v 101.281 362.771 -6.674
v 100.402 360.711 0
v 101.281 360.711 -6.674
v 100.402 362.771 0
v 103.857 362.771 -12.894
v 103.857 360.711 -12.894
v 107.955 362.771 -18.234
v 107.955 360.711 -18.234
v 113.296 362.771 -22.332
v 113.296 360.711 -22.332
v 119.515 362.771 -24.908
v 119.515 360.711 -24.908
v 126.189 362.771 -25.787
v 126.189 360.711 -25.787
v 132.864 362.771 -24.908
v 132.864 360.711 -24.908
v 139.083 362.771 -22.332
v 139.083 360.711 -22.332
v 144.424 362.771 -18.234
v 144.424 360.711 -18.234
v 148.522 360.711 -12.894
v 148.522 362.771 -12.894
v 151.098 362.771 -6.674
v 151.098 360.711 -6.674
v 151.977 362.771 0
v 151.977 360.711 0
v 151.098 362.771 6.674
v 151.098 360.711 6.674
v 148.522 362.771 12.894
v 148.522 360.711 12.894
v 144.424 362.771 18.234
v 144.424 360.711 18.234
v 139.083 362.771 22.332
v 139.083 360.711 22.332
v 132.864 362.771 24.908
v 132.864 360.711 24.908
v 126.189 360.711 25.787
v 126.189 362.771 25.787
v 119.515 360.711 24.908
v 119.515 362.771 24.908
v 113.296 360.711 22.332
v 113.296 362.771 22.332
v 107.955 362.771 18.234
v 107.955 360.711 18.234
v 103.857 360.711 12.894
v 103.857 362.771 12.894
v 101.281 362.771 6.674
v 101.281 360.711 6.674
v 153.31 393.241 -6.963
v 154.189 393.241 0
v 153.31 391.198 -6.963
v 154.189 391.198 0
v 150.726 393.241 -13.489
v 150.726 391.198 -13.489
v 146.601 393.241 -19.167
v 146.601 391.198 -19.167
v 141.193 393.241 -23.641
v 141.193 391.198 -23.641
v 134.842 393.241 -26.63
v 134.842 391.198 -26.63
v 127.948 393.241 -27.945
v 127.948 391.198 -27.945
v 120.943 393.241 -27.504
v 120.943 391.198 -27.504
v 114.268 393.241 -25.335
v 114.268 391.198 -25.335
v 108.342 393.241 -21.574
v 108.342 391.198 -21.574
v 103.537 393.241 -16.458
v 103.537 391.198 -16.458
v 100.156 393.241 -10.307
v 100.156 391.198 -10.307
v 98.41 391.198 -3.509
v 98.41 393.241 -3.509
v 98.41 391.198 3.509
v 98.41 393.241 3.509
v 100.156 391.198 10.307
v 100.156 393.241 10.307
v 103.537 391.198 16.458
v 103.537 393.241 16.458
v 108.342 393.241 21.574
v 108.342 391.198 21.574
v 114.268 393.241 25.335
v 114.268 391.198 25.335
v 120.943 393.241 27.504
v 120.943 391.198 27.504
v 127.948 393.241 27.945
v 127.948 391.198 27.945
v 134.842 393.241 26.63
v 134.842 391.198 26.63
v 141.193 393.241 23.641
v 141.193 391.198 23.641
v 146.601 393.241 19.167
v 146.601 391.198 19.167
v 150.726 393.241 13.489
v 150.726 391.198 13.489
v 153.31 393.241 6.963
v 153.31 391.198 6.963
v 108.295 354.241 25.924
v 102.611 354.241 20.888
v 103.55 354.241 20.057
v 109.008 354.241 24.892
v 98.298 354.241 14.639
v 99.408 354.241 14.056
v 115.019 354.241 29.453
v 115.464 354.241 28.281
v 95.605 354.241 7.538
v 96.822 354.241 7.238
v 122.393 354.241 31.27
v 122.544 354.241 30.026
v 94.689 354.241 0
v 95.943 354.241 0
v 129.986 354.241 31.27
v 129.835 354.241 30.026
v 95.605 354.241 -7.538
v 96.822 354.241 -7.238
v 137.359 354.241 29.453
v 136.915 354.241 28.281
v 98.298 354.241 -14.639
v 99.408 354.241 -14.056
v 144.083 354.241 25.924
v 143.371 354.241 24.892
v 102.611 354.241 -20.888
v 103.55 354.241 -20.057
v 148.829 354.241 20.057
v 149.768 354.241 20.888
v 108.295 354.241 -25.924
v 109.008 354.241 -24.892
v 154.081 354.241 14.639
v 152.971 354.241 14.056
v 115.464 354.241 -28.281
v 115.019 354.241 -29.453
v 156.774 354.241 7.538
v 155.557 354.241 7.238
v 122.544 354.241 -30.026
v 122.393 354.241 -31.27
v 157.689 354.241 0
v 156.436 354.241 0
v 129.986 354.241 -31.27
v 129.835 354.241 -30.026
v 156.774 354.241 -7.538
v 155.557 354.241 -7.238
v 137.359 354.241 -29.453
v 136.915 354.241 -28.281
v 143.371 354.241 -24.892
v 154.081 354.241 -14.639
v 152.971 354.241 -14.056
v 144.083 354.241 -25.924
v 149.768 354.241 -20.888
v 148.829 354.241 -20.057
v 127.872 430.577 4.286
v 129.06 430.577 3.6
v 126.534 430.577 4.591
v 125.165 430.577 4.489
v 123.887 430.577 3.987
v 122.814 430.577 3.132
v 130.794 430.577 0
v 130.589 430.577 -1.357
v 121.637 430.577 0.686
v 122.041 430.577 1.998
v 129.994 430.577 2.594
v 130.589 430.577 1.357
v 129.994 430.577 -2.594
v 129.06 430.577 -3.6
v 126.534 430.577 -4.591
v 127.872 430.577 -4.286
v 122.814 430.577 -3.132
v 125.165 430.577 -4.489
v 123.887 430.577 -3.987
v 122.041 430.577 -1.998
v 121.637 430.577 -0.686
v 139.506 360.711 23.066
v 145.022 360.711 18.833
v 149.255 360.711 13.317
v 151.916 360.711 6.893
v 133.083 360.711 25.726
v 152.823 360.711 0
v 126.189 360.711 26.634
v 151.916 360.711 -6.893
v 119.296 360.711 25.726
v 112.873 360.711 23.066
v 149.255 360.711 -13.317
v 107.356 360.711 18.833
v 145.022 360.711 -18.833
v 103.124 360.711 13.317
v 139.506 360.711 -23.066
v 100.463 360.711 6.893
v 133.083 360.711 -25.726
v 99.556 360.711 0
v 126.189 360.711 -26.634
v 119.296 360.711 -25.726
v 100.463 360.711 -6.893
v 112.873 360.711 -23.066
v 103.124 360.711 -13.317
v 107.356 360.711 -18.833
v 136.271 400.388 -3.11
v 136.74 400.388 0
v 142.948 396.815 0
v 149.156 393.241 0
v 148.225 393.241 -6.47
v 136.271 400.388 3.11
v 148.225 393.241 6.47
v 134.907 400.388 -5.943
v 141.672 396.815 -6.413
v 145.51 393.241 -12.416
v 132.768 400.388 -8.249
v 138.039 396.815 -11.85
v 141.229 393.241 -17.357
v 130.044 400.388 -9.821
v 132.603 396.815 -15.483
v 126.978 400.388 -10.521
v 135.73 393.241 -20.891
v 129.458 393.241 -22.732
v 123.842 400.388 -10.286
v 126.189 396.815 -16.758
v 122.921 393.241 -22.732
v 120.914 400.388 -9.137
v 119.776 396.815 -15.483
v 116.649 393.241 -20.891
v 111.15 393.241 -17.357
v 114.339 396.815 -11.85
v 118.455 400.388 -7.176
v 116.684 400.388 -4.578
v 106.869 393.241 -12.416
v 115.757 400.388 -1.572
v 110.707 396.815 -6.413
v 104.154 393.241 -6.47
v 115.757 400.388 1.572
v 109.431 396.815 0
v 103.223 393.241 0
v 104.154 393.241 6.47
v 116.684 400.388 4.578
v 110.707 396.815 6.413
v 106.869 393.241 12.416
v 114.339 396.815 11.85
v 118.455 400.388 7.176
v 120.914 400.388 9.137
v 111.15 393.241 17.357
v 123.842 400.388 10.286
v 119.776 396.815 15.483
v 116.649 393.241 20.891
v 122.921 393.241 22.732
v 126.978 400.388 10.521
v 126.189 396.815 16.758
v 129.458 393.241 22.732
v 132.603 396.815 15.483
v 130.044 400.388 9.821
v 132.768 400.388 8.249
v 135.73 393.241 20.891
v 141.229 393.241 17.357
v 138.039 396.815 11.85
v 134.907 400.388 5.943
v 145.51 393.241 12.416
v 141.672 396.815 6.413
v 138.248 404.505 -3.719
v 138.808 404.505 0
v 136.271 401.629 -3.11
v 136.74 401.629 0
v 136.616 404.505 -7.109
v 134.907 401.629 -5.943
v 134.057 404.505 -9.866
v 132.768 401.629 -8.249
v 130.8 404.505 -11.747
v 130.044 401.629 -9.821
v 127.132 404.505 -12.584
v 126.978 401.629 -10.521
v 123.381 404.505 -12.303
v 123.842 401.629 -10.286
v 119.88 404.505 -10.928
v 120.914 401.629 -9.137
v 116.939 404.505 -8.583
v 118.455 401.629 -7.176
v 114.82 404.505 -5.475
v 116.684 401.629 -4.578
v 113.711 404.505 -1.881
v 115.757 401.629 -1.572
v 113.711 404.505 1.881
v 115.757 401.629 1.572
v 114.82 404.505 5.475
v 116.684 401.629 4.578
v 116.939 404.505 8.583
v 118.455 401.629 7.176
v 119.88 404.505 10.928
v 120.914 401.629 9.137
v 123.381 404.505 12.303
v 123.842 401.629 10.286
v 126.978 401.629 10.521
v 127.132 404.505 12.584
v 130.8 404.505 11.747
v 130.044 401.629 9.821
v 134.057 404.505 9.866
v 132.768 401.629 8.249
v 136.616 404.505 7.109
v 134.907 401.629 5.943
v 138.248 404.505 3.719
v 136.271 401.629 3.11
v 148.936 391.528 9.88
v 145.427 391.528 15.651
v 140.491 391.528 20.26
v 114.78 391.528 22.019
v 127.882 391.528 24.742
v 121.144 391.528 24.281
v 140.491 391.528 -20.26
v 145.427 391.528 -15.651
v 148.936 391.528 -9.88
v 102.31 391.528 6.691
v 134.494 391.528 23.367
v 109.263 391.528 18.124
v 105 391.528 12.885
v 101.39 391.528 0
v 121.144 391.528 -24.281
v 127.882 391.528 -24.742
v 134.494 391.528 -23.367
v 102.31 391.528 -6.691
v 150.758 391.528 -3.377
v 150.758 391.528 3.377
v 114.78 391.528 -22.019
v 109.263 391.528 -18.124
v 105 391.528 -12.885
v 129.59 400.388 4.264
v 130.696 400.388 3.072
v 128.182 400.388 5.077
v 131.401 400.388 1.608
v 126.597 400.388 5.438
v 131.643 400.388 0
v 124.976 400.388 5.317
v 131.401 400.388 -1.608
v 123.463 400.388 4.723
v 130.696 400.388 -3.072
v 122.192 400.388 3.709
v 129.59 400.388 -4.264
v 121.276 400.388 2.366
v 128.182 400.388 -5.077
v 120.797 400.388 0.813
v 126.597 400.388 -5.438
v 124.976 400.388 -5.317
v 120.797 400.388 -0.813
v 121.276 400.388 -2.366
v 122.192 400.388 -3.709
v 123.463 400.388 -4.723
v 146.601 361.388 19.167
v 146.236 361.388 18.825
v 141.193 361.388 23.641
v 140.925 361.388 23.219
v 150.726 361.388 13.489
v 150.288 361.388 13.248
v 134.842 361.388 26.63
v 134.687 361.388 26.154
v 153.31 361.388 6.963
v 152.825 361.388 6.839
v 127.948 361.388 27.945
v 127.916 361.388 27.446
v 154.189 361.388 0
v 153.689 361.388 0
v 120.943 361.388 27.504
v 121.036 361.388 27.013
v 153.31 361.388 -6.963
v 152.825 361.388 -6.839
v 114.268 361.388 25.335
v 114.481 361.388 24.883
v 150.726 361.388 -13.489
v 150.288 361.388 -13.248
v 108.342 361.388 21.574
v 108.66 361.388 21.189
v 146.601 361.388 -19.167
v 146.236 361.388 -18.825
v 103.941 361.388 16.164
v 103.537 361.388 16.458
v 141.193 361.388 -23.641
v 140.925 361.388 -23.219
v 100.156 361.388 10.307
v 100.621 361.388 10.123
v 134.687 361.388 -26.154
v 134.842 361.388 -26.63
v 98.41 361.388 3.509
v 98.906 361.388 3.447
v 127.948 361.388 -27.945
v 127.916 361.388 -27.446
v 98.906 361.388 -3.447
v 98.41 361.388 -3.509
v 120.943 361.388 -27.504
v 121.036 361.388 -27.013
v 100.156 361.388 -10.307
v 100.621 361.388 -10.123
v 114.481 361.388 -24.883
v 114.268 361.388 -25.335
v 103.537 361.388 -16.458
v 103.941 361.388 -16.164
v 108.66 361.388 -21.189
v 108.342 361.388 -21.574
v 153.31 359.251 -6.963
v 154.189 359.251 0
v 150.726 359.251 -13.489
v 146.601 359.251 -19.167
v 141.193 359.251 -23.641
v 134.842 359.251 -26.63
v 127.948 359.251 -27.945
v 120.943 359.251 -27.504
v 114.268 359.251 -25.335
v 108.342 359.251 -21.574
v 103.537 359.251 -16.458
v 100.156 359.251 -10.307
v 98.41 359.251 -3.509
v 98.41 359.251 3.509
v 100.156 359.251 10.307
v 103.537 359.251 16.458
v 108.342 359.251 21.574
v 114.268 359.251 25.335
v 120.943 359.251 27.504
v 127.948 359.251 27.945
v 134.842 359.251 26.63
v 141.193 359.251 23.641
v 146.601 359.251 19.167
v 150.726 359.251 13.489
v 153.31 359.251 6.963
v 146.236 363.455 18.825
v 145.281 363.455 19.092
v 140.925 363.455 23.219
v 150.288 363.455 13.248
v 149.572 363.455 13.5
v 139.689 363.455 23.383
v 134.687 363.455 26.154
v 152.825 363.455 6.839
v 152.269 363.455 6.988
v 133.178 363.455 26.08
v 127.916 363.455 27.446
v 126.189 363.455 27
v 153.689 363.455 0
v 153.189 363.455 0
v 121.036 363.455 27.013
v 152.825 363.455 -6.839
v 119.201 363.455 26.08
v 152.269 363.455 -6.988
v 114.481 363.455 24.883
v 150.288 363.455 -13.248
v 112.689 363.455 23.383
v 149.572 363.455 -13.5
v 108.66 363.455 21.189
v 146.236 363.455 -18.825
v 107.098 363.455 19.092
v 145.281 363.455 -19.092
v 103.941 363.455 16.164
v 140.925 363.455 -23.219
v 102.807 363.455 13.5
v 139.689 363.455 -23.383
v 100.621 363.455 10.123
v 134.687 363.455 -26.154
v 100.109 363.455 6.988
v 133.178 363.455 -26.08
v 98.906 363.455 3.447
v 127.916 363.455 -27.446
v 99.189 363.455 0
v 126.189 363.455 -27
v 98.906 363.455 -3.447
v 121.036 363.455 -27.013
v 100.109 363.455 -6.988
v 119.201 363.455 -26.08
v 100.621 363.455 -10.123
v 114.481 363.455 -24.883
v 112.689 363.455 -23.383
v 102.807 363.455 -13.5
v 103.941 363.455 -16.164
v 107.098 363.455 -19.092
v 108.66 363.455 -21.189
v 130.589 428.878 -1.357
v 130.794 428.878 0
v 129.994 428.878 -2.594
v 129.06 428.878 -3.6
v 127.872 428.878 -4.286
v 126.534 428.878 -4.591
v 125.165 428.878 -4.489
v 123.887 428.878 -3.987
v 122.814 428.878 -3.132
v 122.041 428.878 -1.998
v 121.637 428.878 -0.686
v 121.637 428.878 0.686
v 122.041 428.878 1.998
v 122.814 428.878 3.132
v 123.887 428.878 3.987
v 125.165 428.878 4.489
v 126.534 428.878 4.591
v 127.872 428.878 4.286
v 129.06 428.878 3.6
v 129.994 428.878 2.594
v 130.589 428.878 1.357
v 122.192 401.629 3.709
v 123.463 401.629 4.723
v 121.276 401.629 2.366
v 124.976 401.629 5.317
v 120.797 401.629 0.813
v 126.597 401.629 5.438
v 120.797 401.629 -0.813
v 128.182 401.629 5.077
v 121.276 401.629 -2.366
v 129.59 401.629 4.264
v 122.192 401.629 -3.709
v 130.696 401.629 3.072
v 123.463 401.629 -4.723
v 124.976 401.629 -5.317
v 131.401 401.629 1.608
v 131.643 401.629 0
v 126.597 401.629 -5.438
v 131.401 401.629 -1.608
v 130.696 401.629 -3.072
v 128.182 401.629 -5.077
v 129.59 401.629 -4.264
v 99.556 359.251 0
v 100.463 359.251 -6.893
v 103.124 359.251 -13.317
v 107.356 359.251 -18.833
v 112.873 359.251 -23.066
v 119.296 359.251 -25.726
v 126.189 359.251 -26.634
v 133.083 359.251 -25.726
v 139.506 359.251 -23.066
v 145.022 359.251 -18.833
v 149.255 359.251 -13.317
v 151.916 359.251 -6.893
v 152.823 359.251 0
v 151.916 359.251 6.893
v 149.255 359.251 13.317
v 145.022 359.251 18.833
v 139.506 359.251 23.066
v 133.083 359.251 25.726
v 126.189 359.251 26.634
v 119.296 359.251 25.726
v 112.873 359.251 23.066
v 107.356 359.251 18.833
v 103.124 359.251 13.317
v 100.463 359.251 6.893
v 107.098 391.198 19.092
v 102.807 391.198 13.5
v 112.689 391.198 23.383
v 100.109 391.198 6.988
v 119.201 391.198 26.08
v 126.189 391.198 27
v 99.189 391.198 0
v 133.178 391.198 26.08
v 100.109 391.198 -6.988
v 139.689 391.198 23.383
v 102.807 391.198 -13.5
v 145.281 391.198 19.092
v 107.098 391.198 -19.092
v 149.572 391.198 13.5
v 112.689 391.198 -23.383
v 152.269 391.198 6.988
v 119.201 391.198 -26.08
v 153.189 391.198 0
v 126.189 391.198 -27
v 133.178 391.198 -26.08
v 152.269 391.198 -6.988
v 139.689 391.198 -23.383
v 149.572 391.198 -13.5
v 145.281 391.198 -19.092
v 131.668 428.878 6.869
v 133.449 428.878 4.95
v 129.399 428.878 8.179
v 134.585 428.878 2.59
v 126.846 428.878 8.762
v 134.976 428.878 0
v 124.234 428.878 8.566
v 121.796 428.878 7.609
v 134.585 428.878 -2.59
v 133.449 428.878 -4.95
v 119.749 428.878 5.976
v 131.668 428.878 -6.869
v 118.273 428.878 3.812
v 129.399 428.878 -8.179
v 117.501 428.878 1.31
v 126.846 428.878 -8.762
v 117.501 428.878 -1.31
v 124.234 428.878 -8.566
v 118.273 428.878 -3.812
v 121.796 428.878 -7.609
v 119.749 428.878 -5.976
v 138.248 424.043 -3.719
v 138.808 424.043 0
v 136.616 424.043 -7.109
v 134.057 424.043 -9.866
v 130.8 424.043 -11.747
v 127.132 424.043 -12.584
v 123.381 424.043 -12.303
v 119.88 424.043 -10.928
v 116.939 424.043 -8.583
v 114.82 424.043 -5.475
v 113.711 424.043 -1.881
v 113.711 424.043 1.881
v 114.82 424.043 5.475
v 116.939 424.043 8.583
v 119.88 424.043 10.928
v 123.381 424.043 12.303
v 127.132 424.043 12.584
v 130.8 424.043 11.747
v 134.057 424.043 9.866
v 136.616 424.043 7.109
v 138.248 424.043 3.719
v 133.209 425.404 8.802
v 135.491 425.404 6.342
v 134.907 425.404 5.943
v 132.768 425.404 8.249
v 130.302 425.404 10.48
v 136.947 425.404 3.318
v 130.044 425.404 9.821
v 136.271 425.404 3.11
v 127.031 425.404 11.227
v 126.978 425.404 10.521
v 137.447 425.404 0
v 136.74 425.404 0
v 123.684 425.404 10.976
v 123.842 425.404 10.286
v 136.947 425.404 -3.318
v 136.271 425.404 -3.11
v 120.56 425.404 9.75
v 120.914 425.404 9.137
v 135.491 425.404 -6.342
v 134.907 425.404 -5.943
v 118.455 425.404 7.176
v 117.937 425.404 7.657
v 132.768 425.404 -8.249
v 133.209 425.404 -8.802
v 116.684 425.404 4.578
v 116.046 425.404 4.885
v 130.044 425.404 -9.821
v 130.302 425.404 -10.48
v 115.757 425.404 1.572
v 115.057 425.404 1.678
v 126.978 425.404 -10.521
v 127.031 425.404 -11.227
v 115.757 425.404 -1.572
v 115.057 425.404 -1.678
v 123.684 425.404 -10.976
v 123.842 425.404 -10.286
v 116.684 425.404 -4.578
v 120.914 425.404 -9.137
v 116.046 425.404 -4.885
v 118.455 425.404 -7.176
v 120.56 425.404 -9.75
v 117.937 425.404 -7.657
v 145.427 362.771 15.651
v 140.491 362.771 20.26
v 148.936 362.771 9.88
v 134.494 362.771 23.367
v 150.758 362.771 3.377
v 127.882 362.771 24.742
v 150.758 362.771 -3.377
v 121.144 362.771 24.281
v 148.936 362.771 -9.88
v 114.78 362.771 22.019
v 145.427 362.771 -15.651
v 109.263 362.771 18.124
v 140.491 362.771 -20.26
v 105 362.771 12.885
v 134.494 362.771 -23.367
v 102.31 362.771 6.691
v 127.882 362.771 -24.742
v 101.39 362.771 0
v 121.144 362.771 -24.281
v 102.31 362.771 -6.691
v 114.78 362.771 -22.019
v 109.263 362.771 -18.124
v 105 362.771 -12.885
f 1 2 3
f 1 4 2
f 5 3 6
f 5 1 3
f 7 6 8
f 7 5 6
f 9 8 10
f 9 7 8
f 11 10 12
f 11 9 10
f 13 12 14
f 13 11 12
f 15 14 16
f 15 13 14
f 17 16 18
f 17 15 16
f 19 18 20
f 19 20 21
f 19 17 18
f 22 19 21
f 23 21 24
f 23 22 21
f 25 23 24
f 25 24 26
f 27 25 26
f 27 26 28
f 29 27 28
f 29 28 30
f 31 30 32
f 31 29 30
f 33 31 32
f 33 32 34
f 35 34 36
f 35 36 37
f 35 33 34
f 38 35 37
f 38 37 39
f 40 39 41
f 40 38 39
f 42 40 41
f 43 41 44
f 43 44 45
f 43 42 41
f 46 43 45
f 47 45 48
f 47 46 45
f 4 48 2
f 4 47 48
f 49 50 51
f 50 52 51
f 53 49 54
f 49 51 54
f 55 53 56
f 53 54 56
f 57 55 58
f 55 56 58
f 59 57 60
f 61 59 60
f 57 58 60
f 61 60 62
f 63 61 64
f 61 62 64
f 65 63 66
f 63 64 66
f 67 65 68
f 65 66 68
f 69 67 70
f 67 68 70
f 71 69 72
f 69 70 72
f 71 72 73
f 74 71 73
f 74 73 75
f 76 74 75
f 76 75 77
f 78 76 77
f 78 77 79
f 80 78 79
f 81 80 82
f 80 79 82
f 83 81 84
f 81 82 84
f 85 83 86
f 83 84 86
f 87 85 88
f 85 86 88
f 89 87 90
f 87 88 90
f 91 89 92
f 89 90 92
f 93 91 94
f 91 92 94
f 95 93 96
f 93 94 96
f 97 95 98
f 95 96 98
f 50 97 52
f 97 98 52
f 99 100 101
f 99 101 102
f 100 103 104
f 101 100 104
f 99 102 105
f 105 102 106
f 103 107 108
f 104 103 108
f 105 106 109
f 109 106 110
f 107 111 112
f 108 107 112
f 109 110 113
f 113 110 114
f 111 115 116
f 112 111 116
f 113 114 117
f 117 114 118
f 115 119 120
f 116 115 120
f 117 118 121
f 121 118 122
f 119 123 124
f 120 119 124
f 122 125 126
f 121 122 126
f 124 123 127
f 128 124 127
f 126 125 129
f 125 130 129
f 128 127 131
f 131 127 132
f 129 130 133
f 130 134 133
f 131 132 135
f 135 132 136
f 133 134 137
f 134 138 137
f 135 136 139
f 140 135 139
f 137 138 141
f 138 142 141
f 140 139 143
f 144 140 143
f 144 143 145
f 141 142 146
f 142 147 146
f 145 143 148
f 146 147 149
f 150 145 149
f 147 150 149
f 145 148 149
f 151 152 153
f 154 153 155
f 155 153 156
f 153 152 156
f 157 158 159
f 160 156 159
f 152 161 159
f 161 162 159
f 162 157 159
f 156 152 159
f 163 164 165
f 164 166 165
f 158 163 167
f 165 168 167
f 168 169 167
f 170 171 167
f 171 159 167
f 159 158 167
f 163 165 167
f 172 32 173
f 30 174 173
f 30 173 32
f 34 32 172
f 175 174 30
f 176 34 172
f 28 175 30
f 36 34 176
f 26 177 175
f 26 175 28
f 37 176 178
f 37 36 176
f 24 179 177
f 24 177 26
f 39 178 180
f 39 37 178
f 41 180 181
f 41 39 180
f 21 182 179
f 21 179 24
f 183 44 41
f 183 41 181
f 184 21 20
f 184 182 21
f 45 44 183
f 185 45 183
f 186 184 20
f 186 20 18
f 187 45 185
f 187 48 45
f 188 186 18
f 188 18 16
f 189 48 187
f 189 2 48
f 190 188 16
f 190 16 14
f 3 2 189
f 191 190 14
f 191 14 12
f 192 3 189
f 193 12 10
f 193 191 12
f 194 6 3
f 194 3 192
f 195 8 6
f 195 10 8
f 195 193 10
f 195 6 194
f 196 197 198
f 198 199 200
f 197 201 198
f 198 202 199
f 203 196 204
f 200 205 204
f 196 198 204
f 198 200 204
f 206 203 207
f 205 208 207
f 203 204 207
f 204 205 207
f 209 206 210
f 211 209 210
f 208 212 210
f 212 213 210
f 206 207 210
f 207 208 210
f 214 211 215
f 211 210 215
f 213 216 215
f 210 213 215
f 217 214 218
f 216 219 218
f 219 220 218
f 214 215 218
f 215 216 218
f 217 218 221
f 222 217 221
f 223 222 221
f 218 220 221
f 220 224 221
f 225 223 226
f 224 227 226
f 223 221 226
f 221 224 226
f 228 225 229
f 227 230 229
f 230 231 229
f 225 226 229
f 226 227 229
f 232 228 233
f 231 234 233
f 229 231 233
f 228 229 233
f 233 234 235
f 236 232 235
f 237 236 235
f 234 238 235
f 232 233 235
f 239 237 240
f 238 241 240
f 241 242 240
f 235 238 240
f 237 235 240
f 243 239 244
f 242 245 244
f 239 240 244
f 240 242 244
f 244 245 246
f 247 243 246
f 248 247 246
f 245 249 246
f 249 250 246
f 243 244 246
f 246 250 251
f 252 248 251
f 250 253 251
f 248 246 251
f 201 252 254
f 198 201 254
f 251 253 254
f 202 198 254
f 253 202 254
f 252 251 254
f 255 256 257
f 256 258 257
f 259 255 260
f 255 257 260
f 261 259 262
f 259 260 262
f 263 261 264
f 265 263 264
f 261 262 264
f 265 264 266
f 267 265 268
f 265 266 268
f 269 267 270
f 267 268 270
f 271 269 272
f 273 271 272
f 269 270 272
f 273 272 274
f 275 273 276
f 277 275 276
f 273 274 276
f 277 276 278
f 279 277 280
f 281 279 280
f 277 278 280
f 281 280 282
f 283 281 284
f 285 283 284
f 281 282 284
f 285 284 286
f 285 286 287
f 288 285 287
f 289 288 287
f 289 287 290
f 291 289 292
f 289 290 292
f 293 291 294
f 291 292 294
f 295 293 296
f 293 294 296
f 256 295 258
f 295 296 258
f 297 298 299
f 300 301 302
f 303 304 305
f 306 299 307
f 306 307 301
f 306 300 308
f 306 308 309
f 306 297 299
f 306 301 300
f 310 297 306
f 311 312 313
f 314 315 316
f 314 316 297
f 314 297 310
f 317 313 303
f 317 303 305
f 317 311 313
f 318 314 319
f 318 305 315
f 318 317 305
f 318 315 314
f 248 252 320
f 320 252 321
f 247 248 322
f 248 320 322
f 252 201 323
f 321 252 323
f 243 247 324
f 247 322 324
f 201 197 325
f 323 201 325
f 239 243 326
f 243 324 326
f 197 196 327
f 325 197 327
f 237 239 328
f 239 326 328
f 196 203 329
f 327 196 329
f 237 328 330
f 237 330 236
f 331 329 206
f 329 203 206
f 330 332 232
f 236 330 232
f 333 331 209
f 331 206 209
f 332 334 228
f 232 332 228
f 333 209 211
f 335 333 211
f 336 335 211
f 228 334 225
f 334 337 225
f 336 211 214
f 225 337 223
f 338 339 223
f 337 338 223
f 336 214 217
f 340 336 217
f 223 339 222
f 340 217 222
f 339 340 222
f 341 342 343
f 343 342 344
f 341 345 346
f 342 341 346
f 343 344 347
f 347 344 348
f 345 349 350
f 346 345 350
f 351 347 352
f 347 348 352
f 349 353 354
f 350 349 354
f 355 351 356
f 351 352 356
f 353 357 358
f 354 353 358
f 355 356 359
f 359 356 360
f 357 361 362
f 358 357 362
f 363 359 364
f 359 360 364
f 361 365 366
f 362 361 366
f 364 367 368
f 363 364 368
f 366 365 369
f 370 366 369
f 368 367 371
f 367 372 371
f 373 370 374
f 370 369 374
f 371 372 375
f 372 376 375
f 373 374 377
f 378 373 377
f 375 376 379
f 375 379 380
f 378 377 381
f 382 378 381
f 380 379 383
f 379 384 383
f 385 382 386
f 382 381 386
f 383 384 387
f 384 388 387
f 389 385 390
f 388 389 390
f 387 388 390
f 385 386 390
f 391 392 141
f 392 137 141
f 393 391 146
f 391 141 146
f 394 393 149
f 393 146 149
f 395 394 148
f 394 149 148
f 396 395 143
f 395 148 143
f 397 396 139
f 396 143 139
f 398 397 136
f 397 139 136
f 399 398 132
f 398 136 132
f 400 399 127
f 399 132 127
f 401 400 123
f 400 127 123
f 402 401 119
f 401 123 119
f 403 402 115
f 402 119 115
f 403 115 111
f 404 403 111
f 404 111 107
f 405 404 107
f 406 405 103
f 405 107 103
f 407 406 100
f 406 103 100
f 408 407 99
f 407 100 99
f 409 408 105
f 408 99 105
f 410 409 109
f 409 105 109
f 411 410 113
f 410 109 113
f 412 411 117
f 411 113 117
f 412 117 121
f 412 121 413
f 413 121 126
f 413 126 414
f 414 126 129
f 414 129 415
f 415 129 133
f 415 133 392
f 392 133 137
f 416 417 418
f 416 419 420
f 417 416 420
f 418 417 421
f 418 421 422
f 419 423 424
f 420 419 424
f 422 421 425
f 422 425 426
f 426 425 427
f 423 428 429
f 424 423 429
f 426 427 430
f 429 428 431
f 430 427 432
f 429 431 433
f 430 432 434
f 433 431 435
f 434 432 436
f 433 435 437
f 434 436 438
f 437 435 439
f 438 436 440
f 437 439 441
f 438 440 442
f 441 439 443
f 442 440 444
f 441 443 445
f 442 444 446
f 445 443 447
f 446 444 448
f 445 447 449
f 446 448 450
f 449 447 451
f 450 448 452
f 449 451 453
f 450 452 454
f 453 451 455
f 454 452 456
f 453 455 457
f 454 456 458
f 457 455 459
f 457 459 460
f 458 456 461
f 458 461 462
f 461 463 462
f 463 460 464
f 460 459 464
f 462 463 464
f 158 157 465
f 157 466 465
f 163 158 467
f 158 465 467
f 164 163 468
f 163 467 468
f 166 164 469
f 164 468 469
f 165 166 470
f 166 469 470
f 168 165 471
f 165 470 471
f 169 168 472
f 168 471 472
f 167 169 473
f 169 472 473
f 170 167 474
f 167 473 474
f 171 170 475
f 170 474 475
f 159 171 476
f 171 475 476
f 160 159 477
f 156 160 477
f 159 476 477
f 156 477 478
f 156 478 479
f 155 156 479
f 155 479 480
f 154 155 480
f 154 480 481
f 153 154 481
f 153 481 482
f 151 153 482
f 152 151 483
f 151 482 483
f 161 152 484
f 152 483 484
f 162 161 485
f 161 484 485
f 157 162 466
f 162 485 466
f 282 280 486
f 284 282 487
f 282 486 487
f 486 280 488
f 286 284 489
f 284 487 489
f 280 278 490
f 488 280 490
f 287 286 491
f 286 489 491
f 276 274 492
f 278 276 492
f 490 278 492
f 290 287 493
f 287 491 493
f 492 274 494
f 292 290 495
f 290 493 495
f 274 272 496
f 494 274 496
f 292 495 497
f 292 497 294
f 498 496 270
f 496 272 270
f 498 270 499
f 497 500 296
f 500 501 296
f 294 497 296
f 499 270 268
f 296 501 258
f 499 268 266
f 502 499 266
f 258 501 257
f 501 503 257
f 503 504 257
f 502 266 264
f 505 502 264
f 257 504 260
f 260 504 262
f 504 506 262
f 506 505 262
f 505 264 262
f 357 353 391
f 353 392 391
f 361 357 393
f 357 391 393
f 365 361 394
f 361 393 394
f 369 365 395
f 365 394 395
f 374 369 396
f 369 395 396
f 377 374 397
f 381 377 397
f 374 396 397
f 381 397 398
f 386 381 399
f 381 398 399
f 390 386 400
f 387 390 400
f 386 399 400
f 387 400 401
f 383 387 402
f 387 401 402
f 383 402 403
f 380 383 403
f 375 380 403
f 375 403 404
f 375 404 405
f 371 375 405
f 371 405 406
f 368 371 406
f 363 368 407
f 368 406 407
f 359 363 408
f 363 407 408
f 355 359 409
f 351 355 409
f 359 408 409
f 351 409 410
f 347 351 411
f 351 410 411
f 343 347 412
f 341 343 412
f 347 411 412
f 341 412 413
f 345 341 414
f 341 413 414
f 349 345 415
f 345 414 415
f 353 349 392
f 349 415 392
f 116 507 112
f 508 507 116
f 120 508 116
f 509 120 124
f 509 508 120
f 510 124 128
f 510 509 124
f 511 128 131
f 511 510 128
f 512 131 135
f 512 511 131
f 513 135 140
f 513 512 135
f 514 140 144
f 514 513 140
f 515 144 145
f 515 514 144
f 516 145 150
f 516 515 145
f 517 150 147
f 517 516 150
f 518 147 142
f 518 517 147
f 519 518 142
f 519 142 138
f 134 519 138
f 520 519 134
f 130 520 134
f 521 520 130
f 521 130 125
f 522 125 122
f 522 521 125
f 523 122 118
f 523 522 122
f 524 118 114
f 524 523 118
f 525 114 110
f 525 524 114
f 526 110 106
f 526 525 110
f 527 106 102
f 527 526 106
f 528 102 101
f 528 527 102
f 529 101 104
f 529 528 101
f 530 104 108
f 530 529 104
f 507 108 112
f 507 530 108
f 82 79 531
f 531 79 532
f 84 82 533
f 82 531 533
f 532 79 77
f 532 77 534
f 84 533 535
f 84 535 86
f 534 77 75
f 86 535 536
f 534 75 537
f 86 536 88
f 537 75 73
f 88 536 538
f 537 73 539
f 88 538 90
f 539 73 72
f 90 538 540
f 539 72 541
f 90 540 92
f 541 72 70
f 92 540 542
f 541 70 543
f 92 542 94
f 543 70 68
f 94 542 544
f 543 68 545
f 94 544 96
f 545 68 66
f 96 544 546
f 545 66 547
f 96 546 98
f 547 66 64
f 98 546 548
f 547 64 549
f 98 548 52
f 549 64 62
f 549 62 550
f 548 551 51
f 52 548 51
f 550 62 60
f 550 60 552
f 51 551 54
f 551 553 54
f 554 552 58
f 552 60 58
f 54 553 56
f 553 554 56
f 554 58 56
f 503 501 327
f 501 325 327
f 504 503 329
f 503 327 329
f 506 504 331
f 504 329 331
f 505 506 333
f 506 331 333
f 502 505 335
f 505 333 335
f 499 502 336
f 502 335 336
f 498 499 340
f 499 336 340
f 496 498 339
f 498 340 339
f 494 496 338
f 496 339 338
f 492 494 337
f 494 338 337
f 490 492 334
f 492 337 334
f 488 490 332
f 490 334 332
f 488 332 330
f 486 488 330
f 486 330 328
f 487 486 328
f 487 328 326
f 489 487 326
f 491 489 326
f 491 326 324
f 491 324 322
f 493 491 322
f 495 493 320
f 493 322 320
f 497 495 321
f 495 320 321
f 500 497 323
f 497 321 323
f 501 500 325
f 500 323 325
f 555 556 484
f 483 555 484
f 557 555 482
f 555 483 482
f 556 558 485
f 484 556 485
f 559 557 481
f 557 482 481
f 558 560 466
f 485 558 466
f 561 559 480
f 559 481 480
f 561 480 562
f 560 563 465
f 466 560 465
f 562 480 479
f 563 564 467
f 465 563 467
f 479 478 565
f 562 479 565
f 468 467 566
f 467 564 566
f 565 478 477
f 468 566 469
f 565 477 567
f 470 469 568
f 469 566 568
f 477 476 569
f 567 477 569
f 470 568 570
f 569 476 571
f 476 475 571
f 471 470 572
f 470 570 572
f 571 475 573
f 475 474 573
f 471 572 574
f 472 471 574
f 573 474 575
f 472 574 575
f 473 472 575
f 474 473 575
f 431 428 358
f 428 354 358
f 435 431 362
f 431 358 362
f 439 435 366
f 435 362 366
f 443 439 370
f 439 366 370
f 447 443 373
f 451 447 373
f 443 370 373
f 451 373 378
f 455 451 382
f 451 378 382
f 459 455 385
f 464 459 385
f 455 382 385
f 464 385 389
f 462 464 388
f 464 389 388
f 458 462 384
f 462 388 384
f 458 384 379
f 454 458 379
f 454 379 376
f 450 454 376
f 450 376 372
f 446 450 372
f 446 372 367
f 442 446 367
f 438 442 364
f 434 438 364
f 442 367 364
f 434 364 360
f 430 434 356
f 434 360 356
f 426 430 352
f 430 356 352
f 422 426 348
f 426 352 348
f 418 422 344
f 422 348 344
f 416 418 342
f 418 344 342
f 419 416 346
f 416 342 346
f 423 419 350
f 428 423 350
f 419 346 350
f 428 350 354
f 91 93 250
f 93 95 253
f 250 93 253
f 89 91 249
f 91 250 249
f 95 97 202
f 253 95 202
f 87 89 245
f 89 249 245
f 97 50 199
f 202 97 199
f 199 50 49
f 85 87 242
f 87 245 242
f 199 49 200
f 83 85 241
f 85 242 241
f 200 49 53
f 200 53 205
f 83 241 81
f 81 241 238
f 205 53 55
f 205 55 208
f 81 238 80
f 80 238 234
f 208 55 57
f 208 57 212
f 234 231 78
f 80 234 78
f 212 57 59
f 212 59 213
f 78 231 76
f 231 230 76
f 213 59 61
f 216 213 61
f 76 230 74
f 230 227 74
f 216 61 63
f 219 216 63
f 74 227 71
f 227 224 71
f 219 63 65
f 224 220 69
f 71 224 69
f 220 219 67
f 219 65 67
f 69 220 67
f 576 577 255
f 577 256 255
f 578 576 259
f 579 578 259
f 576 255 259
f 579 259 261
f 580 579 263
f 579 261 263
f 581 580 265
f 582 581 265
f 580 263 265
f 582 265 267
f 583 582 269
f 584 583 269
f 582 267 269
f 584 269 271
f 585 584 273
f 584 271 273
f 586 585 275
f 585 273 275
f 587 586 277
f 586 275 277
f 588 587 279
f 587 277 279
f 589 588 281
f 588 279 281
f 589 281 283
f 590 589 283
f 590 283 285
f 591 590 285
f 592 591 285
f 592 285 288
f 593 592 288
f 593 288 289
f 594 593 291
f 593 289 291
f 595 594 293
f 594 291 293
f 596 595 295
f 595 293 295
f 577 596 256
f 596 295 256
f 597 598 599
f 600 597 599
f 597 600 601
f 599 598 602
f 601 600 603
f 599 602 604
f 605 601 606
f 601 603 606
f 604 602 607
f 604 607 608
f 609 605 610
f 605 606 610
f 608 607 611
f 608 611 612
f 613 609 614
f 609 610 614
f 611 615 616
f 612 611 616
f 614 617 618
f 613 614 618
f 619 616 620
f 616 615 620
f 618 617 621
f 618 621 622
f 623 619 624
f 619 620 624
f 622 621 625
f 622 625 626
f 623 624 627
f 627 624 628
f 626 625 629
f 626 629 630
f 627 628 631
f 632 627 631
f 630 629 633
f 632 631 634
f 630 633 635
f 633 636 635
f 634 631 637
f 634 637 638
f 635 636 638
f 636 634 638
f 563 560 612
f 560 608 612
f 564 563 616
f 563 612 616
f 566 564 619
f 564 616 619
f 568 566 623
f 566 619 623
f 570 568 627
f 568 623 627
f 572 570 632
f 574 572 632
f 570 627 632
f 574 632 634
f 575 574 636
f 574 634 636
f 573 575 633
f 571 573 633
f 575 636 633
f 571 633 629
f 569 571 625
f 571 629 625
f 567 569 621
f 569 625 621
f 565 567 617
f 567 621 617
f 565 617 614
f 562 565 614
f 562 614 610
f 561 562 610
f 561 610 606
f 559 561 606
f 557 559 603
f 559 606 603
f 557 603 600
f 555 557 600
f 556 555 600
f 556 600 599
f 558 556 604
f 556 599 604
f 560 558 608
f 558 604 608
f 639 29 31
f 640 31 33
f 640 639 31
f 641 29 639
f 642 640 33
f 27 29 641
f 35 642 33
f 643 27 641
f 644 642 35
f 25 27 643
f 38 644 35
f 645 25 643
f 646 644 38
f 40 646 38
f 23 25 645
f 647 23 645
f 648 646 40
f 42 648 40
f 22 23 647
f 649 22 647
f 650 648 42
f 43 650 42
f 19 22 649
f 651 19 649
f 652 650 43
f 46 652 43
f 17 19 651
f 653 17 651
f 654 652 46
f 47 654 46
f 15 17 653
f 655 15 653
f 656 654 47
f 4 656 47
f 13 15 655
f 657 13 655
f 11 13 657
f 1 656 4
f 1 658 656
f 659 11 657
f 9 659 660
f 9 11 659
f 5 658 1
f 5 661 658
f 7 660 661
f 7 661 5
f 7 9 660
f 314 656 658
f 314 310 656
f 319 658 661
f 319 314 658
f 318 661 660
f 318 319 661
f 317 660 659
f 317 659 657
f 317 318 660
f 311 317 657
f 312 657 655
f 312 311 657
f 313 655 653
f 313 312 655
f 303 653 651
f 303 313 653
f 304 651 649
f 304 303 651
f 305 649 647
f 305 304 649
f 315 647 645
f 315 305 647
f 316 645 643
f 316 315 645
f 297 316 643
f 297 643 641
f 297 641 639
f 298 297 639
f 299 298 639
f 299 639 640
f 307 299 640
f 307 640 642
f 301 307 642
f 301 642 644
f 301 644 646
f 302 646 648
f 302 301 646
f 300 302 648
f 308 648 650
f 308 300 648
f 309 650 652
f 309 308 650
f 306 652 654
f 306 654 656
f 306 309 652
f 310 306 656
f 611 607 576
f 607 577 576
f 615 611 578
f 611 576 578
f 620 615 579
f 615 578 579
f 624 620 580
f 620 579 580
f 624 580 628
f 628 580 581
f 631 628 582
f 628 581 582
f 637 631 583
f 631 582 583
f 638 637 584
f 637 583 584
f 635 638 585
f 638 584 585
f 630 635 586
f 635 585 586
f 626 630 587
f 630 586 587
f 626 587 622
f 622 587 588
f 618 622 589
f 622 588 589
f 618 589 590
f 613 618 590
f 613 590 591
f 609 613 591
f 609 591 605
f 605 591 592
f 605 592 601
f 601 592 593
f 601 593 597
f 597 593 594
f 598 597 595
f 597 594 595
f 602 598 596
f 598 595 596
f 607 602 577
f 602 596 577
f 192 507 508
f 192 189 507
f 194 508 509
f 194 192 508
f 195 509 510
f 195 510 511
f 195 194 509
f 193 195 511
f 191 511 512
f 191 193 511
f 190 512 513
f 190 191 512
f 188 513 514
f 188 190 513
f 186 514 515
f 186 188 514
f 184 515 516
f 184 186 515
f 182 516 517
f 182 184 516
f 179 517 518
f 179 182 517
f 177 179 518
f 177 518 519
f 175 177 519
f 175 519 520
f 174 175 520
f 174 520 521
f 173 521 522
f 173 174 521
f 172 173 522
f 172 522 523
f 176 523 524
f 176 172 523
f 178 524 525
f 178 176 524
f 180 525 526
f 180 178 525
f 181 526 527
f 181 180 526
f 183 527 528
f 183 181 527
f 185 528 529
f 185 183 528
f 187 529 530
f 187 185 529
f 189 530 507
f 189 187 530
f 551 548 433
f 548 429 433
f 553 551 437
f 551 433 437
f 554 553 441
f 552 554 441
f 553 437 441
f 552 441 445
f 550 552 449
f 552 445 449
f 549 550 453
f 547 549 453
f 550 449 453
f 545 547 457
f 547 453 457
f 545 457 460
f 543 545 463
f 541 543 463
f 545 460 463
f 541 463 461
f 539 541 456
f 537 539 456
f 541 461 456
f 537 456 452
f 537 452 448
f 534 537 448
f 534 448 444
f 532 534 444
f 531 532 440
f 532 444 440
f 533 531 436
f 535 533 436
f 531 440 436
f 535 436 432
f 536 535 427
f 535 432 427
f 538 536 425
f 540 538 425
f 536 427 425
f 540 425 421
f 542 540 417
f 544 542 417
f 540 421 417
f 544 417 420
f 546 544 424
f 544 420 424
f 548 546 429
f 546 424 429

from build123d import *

# Parameters (mm, degrees)
SCALE_1_SCALE = 0.1


with BuildPart() as part:
    # 草图1 one side → 旋转6 (revolve)
    with BuildSketch(Plane.XY, mode=Mode.PRIVATE) as revolve_6_sk:
        Polygon((-188.810566164, -8.557887153), (126.189433836, -8.557887153), (126.189433836, 754.802017268), (80.146848974, 754.802017268), (80.146848974, 737.812396498), (38.326244001, 737.812396498), (20.683176277, 703.0661449), (13.608822902, 703.0661449), (0, 689.457321998), (0, 494.076683139), (20.683176277, 465.32501722), (71.652038589, 465.32501722), (71.652038589, 452.909525118), (20.683176277, 452.909525118), (-103.471744737, 381.442112847), (-153.810566164, 381.442112847), (-153.810566164, 361.011582025), (-143.810566164, 361.011582025), (-143.810566164, 83.57948853), (-148.810566164, 83.57948853), (-148.810566164, 62.91133749), (-153.810566164, 62.91133749), (-153.810566164, 41.54424733), align=None)
    revolve(revolve_6_sk.sketch.rotate(Axis((126.189433836, 41.54424733, 0), (0, 1, 0)), 180), axis=Axis((126.189433836, 41.54424733, 0), (0, 1, 0)))

    # 草图2 → 切除-旋转1 (revolve, cut)
    with BuildSketch(Plane.XY):
        Polygon((-176.273470249, -8.557887153), (-140.148471815, 41.54424733), (-140.148471815, 56.139540799), (-131.681675308, 56.139540799), (-131.681675308, 76.742078968), (-121.803746049, 76.742078968), (-121.803746049, 364.305826939), (126.189433836, 364.305826939), (126.189433836, -8.557887153), align=None)
    revolve(axis=Axis((126.189433836, 364.305826939, 0), (0, -1, 0)), mode=Mode.SUBTRACT)


with BuildPart() as part_1:
    # 缩放比例1: scaled about (126.189433836, 394.552183872, 0)
    add(part.part.scale(SCALE_1_SCALE).moved(Location((113.570490452, 355.096965485, 0))))


solid = part_1.part
